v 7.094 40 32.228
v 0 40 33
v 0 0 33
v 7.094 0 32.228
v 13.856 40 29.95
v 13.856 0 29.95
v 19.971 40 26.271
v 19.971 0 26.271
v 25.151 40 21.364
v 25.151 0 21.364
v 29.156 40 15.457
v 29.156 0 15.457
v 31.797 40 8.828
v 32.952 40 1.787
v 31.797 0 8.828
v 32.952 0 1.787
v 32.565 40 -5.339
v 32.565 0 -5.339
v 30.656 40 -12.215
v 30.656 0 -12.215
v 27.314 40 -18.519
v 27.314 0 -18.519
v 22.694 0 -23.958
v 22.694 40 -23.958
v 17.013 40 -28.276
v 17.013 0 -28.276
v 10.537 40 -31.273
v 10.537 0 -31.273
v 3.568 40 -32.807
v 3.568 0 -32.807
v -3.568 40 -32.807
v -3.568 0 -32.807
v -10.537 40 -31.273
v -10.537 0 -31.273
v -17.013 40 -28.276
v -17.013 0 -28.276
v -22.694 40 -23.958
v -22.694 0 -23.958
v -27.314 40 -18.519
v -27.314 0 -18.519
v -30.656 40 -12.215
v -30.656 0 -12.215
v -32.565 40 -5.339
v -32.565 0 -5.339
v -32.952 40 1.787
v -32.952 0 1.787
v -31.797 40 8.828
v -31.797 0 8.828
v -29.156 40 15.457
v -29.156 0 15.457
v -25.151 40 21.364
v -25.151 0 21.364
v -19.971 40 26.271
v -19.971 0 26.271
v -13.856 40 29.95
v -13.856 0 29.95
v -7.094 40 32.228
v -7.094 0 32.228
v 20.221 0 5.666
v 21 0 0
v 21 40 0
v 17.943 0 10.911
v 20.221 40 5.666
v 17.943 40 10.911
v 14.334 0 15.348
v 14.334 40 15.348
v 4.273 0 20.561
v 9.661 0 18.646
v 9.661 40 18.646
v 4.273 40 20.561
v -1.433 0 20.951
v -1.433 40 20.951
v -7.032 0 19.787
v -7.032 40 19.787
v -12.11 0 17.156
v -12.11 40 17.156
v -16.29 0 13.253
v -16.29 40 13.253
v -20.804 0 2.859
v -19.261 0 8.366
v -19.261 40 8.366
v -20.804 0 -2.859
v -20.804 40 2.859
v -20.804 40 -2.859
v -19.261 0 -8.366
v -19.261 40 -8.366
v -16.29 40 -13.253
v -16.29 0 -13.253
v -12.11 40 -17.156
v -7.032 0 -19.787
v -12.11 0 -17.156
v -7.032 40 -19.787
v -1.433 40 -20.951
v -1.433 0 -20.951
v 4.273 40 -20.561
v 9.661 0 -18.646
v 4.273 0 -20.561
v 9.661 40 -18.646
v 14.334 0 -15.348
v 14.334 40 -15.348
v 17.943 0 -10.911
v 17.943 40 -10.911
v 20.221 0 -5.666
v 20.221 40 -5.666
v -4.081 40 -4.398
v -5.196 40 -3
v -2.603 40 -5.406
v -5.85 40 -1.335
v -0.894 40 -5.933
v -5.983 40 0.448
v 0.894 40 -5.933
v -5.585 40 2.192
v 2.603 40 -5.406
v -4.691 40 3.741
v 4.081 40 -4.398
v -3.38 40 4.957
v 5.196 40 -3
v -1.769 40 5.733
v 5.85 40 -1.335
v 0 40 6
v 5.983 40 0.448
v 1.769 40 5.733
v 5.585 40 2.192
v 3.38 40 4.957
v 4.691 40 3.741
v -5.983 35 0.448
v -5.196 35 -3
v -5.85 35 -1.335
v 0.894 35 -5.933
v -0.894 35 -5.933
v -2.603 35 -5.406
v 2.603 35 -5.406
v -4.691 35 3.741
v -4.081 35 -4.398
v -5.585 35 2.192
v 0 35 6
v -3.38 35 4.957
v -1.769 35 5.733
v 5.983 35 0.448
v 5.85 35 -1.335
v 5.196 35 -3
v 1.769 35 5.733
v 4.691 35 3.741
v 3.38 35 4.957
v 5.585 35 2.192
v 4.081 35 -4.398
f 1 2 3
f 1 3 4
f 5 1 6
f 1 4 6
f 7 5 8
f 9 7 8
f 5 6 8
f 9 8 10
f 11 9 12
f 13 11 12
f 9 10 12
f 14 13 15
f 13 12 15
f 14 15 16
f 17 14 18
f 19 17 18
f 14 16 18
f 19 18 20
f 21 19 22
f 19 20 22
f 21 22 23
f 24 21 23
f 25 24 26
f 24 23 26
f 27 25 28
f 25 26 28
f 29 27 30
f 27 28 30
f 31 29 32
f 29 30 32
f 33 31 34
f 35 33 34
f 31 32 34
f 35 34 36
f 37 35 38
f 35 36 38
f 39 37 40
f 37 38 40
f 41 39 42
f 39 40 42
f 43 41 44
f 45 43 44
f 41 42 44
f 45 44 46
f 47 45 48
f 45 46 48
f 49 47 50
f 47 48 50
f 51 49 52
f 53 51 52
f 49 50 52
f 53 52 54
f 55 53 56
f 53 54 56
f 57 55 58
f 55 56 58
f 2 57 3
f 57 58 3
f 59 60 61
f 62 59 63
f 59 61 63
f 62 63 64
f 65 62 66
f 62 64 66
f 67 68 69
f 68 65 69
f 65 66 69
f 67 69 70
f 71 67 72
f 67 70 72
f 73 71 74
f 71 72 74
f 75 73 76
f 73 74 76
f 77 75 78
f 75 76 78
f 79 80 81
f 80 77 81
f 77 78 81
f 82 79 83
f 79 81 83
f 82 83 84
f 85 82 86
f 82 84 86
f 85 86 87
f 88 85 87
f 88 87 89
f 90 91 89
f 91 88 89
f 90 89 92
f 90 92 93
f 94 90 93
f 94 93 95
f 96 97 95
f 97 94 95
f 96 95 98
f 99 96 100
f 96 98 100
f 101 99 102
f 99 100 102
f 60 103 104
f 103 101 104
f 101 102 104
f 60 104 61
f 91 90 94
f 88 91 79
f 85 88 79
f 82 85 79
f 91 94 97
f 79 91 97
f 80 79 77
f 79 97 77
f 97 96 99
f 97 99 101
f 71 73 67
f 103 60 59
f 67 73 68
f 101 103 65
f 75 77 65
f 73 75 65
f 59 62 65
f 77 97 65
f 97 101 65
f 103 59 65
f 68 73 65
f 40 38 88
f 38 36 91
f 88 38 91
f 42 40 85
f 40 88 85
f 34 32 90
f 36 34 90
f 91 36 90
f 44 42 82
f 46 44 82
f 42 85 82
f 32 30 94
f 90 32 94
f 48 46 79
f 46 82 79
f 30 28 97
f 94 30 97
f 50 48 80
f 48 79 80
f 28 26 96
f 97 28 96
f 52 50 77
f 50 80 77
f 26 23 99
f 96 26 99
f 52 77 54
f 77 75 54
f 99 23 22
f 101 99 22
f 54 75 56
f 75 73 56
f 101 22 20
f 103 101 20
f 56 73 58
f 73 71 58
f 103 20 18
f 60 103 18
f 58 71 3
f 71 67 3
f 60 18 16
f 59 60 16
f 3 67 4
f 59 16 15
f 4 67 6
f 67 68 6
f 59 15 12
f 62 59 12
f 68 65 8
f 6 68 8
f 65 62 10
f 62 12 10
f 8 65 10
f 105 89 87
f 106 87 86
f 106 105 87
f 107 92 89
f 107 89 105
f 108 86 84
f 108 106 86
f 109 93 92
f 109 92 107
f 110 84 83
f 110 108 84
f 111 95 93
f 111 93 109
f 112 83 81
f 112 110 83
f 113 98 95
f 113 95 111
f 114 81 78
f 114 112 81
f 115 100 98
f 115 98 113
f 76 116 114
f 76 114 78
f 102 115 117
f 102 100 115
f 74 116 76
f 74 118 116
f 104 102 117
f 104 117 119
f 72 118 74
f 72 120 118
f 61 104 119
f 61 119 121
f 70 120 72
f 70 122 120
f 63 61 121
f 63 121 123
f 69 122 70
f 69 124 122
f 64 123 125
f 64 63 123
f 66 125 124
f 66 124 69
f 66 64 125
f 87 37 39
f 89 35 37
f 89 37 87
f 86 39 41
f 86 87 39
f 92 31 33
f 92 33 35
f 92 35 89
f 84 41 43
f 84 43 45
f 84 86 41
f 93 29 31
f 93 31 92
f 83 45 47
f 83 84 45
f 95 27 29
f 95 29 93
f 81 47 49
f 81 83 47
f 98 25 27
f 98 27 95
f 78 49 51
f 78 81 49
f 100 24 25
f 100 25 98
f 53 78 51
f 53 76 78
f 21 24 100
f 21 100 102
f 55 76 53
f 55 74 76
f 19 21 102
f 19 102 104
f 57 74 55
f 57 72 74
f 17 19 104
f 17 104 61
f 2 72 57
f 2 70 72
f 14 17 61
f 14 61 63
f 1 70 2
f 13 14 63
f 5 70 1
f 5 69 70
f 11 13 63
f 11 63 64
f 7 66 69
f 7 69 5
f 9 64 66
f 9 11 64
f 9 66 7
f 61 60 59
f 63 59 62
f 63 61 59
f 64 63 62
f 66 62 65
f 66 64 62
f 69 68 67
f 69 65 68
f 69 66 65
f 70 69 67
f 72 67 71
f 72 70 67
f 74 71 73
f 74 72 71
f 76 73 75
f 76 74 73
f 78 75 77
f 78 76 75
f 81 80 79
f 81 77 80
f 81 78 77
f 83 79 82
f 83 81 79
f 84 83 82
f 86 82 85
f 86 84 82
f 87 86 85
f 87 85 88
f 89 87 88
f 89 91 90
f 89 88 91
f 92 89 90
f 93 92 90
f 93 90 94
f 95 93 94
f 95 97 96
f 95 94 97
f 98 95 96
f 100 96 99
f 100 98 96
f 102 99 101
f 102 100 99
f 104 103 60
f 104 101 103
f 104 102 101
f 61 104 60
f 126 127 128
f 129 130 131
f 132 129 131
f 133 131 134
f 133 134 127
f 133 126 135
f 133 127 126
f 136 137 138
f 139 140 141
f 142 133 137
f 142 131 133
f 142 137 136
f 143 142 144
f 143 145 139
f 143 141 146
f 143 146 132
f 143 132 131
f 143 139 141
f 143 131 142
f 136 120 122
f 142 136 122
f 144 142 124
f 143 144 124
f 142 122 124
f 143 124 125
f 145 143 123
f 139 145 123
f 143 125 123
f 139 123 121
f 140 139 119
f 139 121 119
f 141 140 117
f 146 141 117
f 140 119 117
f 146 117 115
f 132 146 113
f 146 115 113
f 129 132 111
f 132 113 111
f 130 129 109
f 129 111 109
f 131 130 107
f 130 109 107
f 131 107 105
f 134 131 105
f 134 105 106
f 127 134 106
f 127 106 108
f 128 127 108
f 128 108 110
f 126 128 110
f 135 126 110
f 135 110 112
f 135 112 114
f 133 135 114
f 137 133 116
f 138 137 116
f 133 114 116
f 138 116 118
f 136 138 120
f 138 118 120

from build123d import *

# Parameters (mm, degrees)
SKETCH_1_R                     = 33
EXTRUDE_1_DEPTH                = 40
SKETCH_2_R                     = 6
CUT_EXTRUDE_1_DEPTH            = 5
SPLIT_BODIES_1_SURFACE_1_BACK  = 102.548
SPLIT_BODIES_1_SURFACE_1_DEPTH = 205.096
SPLIT_BODIES_1_SURFACE_2_BACK  = 102.548
SPLIT_BODIES_1_SURFACE_2_DEPTH = 205.096


with BuildPart() as part:
    # 草图1 → 凸台-拉伸1 (new body)
    with BuildSketch(Plane(origin=(0, 0, 0), x_dir=(1, 0, 0), z_dir=(0, 1, 0))):
        with Locations(Location((0, 0, 0), (0, 0, 270))):
            Circle(SKETCH_1_R)
    extrude(amount=EXTRUDE_1_DEPTH)

    # 草图2 → 切除-拉伸1 (cut)
    with BuildSketch(Plane(origin=(0, 40, 0), x_dir=(1, 0, 0), z_dir=(0, 1, 0))):
        with Locations(Location((0, 0, 0), (0, 0, 270))):
            Circle(SKETCH_2_R)
    extrude(amount=-CUT_EXTRUDE_1_DEPTH, mode=Mode.SUBTRACT)


with BuildPart() as body_2:
    # Split Bodies 1: the piece behind the surface
    add(part.part)
    # Split Bodies 1 surface: a surface, the sketch's curves swept straight by 205.096 mm
    with BuildLine(Plane.XZ.offset(-SPLIT_BODIES_1_SURFACE_1_BACK), mode=Mode.PRIVATE) as split_bodies_1_surface_1_path:
        CenterArc((0, 0), 21, 0, 360)
    split_bodies_1_surface_1 = Shell.extrude(split_bodies_1_surface_1_path.wire(), (0 * SPLIT_BODIES_1_SURFACE_1_DEPTH, -1 * SPLIT_BODIES_1_SURFACE_1_DEPTH, 0 * SPLIT_BODIES_1_SURFACE_1_DEPTH))
    split(bisect_by=split_bodies_1_surface_1, keep=Keep.BOTTOM)


with BuildPart() as part_1:
    add(part.part)

    # Split Bodies 1: split by a surface, the side it looks to stays
    # Split Bodies 1 surface: a surface, the sketch's curves swept straight by 205.096 mm
    with BuildLine(Plane.XZ.offset(-SPLIT_BODIES_1_SURFACE_2_BACK), mode=Mode.PRIVATE) as split_bodies_1_surface_2_path:
        CenterArc((0, 0), 21, 0, 360)
    split_bodies_1_surface_2 = Shell.extrude(split_bodies_1_surface_2_path.wire(), (0 * SPLIT_BODIES_1_SURFACE_2_DEPTH, -1 * SPLIT_BODIES_1_SURFACE_2_DEPTH, 0 * SPLIT_BODIES_1_SURFACE_2_DEPTH))
    split(bisect_by=split_bodies_1_surface_2, keep=Keep.TOP)


solid = Compound([body_2.part, part_1.part])
